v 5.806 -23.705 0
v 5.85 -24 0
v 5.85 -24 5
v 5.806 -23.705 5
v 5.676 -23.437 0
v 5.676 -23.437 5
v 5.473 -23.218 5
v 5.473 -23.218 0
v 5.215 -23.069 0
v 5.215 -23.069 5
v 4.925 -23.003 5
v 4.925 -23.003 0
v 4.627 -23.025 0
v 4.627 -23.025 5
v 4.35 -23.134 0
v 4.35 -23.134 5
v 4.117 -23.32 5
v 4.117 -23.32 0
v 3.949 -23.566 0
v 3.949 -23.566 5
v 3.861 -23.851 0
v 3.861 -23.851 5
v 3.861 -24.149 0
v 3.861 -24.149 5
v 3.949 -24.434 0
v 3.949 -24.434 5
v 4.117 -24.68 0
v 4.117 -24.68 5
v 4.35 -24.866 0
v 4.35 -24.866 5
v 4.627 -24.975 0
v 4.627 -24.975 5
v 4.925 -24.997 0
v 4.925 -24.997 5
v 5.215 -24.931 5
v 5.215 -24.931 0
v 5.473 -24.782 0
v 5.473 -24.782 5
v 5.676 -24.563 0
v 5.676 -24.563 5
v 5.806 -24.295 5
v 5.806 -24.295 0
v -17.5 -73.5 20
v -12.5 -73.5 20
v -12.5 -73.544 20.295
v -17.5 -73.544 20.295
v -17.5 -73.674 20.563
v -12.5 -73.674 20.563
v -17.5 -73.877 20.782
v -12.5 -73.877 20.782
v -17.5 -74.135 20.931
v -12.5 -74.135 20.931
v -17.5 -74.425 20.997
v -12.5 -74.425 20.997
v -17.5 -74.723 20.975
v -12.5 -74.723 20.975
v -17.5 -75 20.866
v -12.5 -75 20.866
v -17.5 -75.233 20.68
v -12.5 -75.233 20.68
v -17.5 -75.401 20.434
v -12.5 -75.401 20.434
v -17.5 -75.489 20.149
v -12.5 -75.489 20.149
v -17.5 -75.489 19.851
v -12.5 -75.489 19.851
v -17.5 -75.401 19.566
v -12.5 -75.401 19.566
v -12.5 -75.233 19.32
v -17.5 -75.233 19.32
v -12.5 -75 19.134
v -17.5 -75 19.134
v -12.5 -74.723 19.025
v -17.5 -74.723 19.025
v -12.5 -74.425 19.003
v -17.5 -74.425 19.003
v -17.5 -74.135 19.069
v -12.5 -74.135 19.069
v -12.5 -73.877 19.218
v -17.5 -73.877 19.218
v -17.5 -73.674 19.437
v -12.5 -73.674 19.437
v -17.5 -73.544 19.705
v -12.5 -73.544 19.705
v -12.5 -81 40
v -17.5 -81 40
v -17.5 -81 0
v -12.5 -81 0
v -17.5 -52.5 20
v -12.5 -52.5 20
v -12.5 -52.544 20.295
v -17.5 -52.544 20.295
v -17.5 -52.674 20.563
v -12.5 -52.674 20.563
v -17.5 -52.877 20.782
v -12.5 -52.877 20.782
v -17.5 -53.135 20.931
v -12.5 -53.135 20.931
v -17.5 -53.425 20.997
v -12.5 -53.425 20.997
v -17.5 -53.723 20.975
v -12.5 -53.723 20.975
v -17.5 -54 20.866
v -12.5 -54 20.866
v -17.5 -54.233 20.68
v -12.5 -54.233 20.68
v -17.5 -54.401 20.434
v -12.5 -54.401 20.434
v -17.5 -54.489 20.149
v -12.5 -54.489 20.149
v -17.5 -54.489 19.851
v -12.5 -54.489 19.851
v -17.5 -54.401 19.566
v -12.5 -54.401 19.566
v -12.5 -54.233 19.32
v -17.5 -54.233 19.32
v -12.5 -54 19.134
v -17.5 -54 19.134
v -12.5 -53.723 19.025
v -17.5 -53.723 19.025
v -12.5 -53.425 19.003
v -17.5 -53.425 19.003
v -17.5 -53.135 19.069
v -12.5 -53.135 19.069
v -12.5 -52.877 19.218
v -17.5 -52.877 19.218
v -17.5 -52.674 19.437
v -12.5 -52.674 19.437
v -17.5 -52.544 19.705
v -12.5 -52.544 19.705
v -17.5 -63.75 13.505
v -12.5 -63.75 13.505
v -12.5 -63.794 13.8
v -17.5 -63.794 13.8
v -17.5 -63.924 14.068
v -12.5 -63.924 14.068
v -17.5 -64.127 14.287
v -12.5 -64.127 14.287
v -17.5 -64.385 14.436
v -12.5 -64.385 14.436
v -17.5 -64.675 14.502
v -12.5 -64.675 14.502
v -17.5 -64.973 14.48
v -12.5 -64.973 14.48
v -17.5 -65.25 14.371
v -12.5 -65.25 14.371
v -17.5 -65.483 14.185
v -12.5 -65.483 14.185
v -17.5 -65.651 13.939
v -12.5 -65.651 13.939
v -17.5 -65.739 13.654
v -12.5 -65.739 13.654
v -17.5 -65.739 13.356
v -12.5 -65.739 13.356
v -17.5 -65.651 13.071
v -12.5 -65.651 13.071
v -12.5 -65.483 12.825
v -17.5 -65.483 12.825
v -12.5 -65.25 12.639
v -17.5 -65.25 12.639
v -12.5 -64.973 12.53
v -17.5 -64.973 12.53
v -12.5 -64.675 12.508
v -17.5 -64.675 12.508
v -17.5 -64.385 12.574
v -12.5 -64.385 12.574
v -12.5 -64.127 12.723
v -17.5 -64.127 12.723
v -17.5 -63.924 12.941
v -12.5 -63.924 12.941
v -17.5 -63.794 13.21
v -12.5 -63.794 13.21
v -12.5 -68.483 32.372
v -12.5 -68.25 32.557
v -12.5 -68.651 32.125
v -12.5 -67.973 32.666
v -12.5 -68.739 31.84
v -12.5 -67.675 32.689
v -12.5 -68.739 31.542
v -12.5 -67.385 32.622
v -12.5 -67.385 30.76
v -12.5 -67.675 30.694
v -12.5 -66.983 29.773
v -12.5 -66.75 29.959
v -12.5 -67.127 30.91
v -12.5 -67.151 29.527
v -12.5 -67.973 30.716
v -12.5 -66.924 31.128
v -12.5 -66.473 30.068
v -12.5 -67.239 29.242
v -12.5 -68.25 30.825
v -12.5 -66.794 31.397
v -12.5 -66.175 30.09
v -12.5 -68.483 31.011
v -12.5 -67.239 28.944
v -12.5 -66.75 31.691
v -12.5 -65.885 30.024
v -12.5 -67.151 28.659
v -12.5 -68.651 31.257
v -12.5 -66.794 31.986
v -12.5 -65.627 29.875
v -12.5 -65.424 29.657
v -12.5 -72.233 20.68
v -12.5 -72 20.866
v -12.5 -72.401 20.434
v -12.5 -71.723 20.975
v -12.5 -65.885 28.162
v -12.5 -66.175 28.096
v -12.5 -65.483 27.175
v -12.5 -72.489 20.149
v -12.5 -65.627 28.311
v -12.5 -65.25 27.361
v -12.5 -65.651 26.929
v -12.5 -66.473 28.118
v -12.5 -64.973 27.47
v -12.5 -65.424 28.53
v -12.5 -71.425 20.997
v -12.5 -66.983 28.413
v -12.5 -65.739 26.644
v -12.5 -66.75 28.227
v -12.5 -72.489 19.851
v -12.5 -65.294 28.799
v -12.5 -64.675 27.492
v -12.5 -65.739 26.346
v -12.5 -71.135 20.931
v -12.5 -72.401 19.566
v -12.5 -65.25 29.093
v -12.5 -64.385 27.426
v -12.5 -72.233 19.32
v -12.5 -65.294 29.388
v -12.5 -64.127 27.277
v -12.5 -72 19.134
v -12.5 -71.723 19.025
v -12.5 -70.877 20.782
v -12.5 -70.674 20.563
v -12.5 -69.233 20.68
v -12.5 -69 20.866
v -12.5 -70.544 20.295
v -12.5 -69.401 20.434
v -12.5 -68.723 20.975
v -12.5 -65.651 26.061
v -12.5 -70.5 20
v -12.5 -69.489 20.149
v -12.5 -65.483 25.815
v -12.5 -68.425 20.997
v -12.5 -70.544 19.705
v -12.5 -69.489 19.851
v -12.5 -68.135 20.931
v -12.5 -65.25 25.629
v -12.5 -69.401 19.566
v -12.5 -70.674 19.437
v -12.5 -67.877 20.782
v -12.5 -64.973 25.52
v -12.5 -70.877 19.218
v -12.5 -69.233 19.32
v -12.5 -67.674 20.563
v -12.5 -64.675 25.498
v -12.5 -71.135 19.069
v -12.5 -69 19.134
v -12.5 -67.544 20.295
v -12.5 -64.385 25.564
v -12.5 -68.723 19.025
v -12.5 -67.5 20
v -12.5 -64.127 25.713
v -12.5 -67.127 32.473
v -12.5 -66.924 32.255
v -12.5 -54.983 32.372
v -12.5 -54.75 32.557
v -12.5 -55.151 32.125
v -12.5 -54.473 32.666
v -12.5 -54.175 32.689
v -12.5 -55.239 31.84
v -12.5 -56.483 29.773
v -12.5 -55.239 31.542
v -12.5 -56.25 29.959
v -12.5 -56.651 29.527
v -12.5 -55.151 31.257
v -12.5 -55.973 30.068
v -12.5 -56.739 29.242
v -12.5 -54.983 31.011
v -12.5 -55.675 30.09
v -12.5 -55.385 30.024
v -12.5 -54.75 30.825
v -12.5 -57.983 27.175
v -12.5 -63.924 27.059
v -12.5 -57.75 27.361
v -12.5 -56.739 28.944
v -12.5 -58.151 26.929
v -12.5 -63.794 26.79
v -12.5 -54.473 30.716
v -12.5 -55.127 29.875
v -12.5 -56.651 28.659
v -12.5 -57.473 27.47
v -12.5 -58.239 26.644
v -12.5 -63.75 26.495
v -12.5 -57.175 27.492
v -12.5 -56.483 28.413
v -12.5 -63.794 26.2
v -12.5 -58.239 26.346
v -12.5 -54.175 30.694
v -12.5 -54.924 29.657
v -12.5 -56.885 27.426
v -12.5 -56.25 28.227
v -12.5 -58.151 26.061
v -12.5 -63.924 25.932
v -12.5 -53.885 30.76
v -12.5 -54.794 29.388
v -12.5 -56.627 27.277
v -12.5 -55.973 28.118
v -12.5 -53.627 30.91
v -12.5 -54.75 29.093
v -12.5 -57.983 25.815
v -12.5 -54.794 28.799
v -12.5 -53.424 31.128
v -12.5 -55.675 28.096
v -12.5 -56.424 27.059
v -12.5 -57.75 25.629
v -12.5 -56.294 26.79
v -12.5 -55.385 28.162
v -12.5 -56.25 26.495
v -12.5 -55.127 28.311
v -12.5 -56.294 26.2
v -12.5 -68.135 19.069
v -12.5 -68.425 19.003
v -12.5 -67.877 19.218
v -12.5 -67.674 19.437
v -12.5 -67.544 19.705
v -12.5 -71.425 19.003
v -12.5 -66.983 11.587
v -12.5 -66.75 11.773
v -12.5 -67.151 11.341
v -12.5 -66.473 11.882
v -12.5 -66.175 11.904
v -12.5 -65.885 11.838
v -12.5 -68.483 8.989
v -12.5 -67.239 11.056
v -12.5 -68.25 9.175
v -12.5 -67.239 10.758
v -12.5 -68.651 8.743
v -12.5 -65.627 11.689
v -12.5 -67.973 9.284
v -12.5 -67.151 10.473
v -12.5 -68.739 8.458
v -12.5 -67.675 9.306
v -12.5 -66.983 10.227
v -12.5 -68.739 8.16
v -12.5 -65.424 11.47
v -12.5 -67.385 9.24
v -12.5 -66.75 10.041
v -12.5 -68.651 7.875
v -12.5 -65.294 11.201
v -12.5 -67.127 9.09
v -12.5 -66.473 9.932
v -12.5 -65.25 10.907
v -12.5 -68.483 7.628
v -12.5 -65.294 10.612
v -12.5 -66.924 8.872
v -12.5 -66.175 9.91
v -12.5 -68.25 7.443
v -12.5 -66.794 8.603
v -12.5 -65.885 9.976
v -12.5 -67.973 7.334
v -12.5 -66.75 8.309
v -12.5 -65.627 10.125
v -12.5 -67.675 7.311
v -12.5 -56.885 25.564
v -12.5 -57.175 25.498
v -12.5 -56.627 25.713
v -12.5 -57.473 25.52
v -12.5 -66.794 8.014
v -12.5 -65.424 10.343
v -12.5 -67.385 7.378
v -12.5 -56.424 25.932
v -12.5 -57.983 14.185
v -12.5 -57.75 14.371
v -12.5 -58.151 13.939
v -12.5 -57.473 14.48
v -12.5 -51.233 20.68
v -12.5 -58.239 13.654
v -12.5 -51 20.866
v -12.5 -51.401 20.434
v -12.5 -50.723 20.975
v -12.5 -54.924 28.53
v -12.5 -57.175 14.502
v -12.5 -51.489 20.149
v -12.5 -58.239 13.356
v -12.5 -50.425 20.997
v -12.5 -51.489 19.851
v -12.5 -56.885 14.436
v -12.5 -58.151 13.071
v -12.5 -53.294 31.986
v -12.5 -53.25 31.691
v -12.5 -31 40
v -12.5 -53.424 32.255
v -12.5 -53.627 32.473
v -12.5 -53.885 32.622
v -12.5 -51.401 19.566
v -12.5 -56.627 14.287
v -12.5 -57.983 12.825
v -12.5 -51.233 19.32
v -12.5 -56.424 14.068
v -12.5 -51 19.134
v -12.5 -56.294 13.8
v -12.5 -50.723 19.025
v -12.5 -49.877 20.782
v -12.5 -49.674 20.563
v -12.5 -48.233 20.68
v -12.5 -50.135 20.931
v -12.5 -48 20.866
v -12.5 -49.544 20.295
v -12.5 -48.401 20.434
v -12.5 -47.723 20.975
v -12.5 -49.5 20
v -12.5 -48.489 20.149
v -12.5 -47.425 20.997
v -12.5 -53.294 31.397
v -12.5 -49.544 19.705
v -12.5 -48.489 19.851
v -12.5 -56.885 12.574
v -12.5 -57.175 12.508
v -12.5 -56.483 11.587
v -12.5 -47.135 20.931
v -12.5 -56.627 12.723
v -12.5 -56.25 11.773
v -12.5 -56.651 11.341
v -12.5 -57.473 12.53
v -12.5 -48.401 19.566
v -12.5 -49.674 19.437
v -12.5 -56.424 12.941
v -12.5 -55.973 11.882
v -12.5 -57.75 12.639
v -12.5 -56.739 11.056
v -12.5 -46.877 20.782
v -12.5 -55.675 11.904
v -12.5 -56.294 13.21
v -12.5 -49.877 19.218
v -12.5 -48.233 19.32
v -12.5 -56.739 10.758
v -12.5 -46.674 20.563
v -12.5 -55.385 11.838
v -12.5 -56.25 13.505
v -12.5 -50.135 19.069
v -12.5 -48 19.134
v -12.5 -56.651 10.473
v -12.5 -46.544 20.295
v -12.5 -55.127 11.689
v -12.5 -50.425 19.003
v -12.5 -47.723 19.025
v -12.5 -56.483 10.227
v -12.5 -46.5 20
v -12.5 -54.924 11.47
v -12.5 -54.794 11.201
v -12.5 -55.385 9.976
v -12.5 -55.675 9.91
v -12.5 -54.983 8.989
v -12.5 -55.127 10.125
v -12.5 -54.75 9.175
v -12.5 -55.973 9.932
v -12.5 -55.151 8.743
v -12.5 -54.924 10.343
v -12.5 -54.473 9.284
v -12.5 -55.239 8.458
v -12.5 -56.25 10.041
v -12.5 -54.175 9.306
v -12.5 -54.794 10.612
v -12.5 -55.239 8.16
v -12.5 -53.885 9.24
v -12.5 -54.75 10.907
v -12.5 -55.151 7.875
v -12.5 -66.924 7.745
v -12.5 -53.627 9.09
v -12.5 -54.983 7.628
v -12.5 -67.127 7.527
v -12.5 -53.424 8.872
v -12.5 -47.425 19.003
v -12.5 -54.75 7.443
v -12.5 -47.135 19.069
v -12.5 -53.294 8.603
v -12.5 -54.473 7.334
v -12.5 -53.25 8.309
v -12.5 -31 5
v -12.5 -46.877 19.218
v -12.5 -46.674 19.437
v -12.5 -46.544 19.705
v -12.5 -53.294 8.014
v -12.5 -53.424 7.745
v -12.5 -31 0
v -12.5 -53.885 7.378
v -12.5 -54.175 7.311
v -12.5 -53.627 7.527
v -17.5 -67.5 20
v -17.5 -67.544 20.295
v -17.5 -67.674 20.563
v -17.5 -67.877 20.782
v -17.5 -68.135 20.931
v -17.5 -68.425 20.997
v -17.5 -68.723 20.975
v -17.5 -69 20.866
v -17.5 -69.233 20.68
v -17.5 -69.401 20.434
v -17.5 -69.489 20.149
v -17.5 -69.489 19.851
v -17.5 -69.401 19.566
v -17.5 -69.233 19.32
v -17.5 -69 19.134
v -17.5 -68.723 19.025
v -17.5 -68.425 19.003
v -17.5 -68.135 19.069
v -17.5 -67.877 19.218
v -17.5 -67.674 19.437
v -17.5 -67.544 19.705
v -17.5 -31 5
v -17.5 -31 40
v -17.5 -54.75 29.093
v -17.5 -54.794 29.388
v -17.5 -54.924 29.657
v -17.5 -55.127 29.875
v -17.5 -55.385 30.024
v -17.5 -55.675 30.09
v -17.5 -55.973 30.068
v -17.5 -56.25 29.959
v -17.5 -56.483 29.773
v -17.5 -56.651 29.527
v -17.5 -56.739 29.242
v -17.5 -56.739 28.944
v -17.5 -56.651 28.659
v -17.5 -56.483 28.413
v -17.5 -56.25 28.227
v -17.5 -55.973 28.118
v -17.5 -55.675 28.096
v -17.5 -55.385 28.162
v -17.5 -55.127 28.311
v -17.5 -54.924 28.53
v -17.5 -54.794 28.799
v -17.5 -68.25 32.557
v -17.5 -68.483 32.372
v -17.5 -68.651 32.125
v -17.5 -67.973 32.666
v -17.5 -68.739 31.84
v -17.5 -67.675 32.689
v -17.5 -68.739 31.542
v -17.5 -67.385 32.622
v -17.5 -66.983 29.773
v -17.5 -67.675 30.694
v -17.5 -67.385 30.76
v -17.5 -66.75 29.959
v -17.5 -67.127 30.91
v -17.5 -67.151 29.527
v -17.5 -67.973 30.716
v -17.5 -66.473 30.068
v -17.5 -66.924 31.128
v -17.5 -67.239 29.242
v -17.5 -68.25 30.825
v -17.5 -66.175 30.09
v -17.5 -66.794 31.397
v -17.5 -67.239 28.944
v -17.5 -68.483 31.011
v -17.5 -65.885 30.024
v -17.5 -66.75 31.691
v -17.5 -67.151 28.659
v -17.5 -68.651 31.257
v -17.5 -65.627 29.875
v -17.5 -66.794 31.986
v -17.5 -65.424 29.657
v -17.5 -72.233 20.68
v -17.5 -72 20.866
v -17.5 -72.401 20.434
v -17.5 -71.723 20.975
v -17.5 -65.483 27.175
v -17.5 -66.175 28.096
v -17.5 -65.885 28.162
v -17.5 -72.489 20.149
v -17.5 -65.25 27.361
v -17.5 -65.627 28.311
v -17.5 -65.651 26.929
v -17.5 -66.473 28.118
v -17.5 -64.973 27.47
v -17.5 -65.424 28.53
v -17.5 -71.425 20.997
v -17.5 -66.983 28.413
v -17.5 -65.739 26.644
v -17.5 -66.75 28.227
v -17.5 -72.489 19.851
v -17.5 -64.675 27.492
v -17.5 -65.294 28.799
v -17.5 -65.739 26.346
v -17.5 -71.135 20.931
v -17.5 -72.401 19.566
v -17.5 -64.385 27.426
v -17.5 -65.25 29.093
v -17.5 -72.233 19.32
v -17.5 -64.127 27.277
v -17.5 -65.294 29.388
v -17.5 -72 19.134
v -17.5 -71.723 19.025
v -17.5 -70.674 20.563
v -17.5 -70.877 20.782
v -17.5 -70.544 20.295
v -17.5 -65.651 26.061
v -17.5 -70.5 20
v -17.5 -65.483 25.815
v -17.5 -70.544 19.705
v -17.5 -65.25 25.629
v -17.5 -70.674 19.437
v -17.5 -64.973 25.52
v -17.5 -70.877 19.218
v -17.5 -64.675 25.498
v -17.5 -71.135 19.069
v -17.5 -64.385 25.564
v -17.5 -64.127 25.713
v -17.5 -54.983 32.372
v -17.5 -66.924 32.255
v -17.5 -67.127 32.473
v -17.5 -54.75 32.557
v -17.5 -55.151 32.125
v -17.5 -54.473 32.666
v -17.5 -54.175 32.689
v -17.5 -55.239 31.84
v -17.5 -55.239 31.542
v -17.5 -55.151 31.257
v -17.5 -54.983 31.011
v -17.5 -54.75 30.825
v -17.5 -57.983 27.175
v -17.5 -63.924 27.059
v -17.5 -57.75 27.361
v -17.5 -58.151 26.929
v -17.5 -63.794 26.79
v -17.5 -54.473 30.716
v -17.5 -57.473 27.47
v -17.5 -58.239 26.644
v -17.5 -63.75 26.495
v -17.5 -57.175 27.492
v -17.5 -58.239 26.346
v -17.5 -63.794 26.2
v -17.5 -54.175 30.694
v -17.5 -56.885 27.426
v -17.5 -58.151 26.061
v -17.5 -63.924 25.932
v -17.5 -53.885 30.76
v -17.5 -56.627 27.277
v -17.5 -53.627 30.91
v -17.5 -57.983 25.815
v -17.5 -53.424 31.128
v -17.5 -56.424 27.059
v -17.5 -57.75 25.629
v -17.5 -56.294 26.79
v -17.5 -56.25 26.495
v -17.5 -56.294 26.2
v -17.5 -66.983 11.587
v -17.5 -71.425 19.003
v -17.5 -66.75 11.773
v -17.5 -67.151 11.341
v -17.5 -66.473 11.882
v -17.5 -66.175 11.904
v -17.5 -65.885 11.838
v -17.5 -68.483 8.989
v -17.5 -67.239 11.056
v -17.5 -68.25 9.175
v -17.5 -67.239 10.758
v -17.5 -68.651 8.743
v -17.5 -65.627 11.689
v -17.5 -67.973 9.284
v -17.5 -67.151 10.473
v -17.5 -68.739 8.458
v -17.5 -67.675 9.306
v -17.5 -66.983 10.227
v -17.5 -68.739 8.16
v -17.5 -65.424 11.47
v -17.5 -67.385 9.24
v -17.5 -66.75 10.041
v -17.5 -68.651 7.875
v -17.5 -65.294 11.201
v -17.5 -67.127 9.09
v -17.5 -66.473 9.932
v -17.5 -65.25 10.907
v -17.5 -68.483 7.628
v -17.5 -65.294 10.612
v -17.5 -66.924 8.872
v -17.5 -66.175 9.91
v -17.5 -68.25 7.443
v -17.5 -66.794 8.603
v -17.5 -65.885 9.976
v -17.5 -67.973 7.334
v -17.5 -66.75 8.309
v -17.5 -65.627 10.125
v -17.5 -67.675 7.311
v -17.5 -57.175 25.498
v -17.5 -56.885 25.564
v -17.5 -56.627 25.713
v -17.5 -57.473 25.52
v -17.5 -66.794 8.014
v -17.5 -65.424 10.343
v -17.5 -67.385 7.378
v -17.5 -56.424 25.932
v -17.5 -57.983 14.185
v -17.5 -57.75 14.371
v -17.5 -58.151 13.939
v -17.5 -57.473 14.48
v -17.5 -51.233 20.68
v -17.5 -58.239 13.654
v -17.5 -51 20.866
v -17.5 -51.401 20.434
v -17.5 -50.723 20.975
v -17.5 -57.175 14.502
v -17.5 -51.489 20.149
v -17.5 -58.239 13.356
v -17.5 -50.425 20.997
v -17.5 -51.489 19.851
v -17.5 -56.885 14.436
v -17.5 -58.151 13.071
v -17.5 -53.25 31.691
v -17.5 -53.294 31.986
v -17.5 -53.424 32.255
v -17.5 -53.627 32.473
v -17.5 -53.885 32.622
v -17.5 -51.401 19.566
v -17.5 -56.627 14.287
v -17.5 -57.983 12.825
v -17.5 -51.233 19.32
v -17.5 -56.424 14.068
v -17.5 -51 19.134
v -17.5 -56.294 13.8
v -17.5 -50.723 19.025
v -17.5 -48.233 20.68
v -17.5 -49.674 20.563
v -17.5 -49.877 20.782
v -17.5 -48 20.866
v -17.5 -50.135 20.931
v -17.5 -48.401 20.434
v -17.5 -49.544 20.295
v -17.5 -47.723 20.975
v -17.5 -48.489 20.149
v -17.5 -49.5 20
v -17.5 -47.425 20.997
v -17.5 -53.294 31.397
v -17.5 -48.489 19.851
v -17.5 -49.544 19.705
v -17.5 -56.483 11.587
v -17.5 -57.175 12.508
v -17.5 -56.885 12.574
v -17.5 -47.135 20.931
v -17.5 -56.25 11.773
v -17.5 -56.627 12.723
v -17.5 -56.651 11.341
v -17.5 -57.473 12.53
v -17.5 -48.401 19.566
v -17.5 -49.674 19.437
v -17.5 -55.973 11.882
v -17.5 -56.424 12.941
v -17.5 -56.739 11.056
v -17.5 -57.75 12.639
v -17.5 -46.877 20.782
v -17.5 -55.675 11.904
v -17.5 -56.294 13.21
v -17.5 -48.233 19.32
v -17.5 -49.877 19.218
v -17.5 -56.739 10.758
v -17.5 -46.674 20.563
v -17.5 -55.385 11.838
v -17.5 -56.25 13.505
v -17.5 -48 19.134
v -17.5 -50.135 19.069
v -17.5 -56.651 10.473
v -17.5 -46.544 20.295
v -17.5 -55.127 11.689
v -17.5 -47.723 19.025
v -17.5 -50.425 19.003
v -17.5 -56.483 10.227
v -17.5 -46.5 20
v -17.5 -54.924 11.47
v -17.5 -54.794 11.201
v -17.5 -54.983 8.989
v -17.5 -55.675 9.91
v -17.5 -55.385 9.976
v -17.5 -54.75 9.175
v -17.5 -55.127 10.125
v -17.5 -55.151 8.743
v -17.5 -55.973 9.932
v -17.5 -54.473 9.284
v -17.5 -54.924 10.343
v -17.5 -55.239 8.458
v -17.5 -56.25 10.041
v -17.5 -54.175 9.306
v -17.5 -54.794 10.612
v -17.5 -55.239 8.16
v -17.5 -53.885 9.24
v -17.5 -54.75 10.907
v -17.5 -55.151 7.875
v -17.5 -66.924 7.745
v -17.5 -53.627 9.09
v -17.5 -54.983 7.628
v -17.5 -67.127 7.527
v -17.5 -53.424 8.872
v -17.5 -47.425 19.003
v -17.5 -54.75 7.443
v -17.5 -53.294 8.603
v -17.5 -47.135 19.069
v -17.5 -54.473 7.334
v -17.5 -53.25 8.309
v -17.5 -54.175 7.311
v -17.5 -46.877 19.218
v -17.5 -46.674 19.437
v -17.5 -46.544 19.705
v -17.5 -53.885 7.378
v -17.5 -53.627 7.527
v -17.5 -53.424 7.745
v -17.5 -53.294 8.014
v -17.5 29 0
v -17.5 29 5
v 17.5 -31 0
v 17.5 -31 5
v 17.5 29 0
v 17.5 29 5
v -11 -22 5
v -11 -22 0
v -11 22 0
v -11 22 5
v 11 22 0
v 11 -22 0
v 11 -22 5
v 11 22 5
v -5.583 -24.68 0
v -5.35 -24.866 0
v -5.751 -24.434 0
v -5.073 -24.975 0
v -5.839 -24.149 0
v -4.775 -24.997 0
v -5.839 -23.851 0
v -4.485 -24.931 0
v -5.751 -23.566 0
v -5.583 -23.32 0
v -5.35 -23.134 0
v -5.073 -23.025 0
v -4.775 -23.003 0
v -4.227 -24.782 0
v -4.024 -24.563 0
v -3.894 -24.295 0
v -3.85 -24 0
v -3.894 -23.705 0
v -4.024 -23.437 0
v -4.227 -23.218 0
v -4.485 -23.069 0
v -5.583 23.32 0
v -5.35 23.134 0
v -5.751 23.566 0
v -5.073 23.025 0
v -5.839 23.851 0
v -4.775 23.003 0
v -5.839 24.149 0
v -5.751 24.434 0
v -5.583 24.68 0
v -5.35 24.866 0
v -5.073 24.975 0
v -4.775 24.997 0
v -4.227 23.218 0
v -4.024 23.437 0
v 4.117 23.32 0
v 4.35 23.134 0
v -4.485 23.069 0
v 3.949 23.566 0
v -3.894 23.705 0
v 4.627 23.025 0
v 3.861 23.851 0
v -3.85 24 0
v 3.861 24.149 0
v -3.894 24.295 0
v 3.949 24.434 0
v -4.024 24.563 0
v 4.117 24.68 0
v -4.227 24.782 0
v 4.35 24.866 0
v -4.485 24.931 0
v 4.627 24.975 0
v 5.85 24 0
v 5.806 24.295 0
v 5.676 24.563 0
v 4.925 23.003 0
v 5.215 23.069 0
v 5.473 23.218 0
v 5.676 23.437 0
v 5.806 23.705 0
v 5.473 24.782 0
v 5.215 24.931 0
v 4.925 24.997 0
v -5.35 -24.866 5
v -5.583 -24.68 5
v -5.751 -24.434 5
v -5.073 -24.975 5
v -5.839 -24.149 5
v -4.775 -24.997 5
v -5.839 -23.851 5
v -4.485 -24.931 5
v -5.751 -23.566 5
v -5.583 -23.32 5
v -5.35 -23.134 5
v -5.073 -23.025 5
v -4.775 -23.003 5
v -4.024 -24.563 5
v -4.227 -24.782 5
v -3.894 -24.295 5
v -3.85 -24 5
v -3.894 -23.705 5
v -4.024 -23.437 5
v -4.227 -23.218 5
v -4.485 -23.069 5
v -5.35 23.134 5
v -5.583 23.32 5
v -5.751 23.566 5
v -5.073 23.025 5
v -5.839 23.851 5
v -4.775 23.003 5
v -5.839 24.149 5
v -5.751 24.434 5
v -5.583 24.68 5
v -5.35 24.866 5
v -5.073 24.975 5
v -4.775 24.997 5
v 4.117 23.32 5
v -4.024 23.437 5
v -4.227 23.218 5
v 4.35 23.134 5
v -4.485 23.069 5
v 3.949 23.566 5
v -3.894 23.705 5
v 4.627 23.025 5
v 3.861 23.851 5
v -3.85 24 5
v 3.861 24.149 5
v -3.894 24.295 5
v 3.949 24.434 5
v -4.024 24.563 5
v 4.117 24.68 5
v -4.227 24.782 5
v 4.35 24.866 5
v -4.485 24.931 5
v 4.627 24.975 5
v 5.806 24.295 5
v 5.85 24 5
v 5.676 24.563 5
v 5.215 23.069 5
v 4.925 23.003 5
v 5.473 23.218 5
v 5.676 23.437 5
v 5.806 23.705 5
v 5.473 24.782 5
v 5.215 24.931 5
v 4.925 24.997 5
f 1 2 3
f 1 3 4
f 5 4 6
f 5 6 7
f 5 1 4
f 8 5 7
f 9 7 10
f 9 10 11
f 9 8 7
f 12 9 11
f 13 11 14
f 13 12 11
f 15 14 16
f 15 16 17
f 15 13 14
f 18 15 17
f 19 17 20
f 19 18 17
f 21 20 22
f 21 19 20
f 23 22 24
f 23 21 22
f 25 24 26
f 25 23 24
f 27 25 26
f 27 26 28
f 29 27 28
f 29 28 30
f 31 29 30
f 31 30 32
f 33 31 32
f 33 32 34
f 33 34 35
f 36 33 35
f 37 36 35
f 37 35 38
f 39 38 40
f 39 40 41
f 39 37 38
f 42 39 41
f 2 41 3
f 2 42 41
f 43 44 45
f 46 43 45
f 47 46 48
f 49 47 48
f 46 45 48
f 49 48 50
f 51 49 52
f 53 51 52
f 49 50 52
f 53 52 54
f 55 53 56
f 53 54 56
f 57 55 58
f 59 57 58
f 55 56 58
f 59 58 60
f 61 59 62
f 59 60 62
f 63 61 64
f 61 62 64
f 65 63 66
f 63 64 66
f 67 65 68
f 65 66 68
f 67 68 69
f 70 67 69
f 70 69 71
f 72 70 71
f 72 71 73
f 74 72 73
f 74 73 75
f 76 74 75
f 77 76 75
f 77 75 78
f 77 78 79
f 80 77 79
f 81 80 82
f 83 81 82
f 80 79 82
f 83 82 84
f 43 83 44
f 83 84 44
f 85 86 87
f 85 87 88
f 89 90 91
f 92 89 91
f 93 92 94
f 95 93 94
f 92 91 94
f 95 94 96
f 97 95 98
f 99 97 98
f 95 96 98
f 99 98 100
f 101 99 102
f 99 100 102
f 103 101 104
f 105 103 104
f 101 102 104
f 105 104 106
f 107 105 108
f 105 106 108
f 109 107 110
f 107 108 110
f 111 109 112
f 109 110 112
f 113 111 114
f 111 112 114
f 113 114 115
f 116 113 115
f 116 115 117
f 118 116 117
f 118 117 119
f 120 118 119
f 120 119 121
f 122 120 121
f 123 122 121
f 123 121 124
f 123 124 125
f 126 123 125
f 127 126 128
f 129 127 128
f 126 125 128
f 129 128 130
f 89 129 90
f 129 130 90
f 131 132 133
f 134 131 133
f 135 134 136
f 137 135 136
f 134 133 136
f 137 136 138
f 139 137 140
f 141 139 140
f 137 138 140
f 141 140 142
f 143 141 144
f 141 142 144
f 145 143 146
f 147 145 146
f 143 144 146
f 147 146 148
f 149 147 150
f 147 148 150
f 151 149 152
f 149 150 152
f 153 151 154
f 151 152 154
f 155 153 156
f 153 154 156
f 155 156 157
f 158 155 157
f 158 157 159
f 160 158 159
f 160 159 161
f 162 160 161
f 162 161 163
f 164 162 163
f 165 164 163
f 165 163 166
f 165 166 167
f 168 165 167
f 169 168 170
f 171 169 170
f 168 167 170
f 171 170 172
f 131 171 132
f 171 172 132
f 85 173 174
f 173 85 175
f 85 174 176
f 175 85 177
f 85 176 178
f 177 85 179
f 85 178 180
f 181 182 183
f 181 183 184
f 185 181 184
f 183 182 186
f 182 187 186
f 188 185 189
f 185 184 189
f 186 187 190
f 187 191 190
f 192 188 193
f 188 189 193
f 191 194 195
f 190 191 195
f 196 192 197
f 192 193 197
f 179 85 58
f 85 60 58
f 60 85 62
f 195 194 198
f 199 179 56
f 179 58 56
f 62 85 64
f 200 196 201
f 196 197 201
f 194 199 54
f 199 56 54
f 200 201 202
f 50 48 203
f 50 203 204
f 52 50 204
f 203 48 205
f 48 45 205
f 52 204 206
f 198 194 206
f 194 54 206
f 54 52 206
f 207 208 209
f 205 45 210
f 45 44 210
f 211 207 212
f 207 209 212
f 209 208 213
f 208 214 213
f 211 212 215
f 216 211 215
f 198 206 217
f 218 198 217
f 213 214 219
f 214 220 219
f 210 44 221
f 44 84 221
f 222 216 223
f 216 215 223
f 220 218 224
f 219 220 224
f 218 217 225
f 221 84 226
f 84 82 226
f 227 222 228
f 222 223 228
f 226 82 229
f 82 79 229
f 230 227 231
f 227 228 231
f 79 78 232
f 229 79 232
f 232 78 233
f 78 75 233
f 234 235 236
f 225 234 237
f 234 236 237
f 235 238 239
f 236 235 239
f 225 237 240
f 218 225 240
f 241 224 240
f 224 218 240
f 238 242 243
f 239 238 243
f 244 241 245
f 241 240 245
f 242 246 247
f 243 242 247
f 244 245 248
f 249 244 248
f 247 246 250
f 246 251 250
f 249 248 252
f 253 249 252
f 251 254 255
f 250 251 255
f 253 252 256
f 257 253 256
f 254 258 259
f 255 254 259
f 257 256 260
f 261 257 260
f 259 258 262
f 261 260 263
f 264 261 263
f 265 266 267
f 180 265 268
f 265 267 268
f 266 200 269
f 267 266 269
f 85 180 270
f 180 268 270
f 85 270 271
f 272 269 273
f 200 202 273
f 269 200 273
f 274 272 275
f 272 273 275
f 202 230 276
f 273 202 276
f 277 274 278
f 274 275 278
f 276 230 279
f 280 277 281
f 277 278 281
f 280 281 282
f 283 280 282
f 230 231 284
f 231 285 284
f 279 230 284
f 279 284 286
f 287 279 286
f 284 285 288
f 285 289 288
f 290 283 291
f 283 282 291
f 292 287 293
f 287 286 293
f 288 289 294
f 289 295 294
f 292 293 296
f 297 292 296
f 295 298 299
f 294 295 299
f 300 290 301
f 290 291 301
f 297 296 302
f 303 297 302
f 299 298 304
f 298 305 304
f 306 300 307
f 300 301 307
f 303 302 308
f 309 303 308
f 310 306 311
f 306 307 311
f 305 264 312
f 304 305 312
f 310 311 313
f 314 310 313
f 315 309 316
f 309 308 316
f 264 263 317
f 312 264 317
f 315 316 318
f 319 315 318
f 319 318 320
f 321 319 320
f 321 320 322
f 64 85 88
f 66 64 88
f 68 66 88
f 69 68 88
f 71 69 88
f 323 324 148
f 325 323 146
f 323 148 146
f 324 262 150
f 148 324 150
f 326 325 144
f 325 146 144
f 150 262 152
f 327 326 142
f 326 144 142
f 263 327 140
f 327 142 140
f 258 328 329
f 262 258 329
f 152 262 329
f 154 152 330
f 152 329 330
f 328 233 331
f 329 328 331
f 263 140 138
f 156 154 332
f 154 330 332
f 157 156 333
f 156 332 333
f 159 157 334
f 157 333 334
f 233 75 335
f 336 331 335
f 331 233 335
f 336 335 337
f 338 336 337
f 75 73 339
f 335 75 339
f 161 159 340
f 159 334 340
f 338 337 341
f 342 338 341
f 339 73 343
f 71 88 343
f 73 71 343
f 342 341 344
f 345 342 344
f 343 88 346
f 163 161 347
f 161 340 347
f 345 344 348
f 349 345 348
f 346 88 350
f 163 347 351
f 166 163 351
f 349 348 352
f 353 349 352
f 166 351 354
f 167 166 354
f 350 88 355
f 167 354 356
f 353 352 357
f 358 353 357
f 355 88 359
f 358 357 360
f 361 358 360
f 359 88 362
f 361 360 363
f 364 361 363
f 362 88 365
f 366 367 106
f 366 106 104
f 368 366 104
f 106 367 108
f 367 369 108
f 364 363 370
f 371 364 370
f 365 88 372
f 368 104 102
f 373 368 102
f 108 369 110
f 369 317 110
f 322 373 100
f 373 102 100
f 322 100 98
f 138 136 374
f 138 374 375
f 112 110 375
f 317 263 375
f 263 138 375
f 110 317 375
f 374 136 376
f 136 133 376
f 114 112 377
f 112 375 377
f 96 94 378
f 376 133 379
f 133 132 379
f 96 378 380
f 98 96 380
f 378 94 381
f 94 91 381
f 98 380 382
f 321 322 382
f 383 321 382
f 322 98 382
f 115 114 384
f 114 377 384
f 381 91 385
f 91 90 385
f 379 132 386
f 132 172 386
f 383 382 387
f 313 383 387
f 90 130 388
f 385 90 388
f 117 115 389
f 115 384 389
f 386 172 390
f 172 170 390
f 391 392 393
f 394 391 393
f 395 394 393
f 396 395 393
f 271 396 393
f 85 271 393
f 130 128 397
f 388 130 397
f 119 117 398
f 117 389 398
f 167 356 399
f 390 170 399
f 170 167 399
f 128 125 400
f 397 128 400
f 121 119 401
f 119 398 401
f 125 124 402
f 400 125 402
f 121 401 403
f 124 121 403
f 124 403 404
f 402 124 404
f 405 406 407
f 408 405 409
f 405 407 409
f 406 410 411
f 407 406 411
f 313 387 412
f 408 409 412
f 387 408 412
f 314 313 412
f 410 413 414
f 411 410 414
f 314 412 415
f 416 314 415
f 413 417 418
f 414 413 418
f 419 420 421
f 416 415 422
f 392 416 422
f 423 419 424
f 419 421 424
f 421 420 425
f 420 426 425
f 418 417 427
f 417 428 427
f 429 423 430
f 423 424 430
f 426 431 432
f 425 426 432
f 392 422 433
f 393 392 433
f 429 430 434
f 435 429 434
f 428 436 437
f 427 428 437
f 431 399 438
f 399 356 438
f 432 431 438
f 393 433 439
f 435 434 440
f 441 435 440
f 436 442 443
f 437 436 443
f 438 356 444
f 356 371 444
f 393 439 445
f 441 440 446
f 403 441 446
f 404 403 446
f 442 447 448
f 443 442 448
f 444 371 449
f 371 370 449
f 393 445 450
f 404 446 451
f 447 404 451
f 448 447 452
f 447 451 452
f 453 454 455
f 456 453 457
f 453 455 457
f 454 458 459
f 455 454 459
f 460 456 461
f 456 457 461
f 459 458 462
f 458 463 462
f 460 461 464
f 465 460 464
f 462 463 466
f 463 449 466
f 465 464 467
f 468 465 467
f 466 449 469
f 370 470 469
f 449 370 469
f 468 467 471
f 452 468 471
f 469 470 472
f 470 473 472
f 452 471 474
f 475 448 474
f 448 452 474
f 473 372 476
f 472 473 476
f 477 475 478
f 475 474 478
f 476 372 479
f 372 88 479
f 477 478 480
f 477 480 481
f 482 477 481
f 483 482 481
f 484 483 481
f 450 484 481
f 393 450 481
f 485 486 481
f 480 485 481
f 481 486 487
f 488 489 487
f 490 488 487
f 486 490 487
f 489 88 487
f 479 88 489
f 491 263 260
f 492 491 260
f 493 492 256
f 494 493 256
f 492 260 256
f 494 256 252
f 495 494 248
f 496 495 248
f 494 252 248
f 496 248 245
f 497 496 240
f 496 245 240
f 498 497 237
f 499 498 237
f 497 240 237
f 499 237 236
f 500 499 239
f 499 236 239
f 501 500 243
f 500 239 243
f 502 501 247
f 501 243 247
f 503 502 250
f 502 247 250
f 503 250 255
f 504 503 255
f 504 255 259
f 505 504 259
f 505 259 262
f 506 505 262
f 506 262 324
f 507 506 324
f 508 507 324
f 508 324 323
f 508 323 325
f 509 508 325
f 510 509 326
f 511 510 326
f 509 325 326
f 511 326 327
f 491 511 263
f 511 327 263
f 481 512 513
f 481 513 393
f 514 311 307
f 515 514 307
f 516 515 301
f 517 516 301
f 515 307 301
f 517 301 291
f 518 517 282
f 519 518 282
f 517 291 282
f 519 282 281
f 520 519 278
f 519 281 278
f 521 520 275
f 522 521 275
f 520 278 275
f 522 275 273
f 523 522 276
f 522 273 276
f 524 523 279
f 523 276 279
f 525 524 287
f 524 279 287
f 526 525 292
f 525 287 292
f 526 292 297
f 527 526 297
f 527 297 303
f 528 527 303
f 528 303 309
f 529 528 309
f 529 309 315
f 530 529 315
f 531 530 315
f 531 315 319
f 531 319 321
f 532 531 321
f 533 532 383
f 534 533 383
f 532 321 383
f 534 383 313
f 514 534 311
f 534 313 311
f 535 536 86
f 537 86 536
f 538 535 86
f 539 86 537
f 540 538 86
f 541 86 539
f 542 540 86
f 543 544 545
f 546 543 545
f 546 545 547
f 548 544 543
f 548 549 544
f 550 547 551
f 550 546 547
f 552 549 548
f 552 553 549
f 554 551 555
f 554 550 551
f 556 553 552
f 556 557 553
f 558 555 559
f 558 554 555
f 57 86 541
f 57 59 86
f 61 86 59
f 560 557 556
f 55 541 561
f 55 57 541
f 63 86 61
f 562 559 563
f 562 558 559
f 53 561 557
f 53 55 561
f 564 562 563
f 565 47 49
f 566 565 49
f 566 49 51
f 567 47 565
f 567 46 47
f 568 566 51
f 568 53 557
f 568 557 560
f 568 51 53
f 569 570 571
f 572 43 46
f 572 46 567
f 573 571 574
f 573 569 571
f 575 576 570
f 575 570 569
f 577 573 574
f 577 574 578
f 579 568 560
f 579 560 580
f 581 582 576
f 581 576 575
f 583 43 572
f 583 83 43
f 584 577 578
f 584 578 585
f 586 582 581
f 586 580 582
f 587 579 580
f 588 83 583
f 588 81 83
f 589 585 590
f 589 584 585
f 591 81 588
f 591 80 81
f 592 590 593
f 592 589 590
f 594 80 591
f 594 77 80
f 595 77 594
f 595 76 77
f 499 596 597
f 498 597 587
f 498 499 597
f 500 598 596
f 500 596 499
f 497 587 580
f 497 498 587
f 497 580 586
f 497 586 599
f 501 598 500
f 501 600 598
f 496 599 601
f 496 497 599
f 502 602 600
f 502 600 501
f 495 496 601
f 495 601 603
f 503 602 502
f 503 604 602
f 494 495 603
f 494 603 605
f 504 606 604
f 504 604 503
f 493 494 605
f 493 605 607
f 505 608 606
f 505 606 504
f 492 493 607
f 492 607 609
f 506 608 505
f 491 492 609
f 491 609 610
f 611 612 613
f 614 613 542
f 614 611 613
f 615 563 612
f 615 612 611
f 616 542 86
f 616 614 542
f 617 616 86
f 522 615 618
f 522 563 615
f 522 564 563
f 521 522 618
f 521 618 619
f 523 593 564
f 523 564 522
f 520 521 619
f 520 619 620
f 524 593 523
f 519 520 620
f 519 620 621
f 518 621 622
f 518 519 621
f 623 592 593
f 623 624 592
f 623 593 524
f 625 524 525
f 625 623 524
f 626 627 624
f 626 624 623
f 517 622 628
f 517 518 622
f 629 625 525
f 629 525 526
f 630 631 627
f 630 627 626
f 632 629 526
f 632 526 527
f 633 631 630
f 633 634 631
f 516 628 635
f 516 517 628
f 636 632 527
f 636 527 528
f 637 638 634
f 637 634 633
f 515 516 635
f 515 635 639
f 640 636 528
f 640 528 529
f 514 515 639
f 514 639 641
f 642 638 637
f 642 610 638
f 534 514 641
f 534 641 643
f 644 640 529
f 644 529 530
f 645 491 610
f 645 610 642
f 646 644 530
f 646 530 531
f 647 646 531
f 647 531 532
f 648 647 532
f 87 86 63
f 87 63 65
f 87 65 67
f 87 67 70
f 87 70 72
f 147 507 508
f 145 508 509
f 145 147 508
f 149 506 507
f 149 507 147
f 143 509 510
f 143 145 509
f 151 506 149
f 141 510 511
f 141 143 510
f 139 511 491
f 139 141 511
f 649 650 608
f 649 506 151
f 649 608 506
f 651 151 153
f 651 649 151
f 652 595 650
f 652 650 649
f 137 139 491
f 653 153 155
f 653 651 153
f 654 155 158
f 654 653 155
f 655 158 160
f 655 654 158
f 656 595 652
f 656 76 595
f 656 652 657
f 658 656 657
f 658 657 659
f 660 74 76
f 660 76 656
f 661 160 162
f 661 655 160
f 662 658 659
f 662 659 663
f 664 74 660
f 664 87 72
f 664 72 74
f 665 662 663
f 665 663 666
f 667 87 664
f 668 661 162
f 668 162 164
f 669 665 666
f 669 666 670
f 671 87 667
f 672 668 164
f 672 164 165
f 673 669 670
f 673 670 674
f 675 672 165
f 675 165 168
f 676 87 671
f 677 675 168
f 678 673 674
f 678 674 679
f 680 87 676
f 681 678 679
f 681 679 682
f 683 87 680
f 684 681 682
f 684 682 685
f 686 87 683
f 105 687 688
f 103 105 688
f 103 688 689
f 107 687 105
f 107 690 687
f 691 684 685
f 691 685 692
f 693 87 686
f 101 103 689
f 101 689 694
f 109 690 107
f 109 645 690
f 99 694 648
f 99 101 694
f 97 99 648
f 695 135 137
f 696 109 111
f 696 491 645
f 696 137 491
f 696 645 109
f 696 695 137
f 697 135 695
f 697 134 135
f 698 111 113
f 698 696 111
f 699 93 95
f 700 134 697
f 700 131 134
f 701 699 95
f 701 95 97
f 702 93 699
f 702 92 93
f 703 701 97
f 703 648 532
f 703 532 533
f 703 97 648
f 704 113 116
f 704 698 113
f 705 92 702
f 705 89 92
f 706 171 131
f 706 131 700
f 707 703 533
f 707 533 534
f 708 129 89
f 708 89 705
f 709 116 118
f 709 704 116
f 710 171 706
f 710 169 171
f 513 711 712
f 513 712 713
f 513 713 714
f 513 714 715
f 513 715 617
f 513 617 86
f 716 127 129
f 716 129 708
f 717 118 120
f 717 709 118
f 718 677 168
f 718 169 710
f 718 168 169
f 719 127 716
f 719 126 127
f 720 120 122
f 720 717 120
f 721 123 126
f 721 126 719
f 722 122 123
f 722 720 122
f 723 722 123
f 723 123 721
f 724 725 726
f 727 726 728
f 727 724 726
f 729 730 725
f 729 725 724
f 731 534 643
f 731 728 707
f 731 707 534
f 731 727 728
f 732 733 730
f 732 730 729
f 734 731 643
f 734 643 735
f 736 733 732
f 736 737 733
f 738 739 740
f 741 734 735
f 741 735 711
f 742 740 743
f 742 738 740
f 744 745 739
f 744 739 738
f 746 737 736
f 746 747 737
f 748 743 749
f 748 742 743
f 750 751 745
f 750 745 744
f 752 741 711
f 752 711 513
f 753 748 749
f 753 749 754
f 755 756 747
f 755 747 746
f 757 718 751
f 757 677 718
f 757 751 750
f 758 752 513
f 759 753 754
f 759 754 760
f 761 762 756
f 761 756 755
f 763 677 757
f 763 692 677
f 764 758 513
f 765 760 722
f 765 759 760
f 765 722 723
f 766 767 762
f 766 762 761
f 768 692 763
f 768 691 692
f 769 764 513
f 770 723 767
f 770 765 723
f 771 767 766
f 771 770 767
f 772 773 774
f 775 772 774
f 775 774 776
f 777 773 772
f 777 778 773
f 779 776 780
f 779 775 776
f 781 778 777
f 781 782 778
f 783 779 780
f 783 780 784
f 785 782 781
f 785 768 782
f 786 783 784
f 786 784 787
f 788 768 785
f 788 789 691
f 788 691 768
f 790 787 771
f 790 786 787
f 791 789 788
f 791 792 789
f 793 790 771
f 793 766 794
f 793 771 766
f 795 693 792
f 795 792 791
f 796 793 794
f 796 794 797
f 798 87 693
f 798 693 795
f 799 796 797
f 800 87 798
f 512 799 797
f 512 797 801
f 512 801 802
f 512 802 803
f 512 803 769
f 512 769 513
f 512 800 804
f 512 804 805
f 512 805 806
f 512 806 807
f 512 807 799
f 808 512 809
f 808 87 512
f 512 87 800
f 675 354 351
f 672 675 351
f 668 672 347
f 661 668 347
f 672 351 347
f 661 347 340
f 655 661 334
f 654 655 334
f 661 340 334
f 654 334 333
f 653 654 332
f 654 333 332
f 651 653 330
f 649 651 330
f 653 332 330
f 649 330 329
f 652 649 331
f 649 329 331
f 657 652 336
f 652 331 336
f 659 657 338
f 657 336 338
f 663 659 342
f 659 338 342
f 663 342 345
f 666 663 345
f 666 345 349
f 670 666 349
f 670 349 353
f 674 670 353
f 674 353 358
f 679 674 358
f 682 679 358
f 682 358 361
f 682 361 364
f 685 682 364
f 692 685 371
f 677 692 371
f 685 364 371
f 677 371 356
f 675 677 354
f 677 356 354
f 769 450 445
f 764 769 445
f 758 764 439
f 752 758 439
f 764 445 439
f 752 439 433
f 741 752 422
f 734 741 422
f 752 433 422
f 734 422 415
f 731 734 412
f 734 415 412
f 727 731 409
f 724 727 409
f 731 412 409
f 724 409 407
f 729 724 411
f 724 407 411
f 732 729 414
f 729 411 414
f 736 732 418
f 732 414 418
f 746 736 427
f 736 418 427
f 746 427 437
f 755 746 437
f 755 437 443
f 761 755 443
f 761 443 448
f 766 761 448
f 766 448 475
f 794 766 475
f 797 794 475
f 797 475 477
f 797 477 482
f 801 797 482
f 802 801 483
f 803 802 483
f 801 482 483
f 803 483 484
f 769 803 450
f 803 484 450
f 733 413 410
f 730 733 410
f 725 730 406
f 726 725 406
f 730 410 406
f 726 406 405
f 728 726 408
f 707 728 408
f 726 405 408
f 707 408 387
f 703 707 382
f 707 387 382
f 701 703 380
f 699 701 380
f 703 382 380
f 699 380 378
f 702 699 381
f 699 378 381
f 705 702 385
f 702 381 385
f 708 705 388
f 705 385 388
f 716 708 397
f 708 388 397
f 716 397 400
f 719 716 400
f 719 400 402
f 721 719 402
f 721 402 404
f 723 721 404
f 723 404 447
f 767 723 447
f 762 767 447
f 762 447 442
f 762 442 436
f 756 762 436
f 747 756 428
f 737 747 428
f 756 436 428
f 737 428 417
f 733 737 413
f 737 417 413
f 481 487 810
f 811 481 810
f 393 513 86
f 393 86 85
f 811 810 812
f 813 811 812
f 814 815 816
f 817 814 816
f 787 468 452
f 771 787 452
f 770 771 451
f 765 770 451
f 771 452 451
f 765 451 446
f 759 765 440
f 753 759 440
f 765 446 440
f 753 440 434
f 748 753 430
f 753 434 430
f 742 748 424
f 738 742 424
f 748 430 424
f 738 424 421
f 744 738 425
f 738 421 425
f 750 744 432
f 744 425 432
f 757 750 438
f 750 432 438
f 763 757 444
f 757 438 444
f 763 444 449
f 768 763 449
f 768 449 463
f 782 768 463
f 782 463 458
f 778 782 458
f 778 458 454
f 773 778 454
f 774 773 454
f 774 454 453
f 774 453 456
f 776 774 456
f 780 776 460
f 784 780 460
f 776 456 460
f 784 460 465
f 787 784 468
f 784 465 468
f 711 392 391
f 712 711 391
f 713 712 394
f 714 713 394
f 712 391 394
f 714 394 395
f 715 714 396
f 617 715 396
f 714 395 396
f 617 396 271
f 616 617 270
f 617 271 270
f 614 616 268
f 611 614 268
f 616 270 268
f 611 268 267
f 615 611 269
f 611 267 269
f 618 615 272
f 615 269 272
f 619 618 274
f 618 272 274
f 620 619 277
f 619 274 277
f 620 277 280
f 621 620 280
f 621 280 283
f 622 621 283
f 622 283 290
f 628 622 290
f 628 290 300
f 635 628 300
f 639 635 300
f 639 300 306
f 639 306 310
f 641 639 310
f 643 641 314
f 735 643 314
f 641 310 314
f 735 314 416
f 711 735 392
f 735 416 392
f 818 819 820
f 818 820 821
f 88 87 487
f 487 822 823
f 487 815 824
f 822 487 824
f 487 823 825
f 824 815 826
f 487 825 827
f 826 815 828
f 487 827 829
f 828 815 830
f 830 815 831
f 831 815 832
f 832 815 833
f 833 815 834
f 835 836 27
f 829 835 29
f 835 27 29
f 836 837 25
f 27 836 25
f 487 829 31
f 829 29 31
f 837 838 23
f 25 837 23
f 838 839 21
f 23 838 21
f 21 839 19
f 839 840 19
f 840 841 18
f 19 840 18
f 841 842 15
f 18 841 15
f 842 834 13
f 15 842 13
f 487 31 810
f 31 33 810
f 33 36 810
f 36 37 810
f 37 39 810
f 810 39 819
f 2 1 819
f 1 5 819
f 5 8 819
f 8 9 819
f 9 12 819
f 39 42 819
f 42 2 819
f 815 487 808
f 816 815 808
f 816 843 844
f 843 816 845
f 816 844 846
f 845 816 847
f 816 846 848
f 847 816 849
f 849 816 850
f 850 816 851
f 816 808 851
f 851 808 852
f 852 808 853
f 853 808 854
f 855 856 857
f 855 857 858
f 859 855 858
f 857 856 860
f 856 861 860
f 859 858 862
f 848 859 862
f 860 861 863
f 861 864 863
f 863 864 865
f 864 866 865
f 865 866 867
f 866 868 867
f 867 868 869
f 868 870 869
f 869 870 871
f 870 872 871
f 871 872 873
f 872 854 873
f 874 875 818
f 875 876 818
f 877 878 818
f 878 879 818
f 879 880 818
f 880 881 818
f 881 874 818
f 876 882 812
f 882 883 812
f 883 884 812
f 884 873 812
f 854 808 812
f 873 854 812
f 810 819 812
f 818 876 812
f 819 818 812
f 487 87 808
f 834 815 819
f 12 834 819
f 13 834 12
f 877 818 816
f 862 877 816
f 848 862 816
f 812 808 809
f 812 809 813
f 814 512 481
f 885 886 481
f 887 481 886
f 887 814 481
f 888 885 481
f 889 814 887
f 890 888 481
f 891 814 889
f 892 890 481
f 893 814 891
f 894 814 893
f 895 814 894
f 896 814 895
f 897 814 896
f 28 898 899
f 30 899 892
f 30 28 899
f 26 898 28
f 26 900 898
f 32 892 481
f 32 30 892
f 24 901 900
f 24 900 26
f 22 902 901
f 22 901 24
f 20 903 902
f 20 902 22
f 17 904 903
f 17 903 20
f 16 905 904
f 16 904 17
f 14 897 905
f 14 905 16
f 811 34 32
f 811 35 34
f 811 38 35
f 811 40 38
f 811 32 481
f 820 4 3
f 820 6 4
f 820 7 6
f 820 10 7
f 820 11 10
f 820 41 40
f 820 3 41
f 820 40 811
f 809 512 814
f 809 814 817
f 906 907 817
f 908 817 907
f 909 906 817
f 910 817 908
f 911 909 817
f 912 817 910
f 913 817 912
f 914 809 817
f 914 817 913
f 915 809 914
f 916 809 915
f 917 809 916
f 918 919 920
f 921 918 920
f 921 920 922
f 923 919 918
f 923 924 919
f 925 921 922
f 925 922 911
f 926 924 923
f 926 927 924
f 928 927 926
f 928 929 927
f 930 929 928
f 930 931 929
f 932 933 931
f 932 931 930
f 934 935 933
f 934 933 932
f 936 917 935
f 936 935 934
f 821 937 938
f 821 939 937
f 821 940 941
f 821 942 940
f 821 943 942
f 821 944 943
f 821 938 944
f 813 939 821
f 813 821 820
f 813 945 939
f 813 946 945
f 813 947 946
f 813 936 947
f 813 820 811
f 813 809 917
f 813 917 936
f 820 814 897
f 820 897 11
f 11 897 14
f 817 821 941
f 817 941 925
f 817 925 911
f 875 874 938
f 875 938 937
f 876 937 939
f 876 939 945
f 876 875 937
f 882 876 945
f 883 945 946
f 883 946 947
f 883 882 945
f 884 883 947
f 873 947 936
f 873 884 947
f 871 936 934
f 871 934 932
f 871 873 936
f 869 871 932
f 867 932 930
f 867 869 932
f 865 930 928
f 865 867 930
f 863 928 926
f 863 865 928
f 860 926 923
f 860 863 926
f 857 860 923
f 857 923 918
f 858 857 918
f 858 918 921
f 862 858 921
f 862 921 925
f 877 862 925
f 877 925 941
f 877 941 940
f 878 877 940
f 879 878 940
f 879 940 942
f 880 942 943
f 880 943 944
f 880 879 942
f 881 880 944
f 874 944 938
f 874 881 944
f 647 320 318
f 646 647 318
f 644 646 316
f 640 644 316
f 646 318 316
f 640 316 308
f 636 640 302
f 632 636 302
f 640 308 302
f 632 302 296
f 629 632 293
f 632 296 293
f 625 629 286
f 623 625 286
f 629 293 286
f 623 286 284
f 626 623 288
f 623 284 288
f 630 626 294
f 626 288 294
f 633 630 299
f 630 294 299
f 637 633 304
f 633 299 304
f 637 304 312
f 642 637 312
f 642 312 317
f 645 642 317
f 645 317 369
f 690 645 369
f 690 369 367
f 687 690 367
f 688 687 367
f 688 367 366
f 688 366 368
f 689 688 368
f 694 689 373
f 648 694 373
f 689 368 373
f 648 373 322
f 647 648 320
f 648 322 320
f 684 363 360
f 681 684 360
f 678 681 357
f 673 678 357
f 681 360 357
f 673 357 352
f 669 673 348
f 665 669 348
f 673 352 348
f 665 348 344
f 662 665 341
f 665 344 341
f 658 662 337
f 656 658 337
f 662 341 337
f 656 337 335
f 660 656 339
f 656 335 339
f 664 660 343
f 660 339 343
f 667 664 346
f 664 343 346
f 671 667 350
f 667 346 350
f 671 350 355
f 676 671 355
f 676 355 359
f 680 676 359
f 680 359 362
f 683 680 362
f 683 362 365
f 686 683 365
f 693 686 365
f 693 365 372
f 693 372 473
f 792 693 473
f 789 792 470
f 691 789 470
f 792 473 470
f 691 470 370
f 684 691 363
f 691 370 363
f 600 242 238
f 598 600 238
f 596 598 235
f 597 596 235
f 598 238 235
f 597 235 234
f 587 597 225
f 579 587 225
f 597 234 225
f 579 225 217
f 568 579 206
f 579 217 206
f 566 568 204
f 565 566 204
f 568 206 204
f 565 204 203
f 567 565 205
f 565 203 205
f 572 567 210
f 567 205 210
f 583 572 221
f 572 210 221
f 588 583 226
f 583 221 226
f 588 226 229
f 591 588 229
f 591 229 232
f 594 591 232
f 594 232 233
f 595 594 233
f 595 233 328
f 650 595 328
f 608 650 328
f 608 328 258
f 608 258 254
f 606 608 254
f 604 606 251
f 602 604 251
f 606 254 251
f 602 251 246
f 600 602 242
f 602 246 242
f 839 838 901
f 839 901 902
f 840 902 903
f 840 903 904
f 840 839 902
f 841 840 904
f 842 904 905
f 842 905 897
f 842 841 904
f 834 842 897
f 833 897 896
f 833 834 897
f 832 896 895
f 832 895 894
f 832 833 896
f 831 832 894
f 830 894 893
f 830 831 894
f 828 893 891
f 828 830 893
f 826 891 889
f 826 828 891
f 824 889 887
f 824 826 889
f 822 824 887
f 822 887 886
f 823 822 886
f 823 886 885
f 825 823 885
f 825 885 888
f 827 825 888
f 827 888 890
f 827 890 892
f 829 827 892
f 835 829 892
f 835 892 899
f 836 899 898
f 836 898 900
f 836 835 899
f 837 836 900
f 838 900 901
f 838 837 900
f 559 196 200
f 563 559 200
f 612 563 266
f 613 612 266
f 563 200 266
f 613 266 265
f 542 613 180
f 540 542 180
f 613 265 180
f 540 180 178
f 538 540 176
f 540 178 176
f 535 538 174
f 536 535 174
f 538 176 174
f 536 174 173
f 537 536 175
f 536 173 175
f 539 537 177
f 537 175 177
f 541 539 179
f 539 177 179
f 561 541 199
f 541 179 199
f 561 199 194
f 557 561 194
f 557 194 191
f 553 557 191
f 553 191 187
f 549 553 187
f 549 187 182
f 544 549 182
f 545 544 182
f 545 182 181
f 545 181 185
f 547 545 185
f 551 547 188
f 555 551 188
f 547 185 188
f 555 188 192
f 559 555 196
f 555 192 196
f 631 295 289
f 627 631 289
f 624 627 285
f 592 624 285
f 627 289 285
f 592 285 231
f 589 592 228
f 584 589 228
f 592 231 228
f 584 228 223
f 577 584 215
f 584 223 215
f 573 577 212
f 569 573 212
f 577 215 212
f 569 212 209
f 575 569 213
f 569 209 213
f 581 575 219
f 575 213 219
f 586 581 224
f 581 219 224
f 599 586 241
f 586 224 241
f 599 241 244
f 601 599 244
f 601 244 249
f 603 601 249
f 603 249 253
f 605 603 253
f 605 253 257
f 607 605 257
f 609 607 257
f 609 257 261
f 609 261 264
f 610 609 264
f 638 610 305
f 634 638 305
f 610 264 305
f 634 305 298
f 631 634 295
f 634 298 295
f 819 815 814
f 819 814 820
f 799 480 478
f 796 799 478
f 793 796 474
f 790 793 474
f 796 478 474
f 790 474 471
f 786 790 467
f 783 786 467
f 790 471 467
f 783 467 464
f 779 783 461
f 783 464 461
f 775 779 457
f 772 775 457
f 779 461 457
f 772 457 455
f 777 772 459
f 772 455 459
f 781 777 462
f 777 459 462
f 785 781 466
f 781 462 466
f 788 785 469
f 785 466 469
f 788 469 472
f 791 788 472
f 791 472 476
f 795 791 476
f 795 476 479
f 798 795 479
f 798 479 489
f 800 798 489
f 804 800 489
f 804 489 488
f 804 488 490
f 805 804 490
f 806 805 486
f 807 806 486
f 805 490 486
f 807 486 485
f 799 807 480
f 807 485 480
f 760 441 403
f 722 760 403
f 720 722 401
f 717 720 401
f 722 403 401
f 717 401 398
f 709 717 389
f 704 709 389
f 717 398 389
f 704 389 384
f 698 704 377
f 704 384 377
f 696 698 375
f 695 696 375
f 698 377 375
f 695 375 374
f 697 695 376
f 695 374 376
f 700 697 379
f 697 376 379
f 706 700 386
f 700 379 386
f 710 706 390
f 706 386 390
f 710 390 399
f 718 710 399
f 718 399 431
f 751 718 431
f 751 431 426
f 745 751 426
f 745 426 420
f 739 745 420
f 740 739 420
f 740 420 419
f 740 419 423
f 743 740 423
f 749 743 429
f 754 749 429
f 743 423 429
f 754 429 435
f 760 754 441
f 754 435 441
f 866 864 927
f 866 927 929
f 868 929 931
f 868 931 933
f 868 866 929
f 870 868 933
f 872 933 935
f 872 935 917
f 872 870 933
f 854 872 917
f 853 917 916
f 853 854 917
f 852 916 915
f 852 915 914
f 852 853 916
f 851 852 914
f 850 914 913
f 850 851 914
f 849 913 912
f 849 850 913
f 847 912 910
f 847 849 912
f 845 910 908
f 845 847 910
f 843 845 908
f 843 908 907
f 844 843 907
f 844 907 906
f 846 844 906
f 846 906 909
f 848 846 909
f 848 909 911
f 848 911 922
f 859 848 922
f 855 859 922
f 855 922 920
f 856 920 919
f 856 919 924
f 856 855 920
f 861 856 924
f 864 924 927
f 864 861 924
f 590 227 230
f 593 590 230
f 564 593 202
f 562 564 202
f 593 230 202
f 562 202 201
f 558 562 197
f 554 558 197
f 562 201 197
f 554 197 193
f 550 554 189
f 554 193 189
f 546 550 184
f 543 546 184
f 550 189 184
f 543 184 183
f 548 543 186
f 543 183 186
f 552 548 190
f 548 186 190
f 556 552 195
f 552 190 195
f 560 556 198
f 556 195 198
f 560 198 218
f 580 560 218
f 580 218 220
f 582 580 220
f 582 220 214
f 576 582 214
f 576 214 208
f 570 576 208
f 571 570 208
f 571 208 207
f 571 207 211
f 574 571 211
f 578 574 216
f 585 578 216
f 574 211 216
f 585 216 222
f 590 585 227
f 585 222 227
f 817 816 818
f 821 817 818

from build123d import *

# Parameters (mm, degrees)
SKETCH1_W           = 35
SKETCH1_H           = 60
SKETCH1_R           = 1
SKETCH1_W_2         = 22
SKETCH1_H_2         = 44
BOSS_EXTRUDE1_DEPTH = 5
SKETCH2_W           = 5
SKETCH2_H           = 50
BOSS_EXTRUDE2_DEPTH = 40
SKETCH3_R           = 1
CUT_EXTRUDE1_DEPTH  = 5


with BuildPart() as part:
    # Sketch1 → Boss-Extrude1 (new body)
    with BuildSketch(Plane.XY):
        with Locations((0, -1)):
            Rectangle(SKETCH1_W, SKETCH1_H)
        with Locations((-4.85, -24)):
            Circle(SKETCH1_R, mode=Mode.SUBTRACT)
        with Locations((4.85, -24)):
            Circle(SKETCH1_R, mode=Mode.SUBTRACT)
        with Locations((4.85, 24)):
            Circle(SKETCH1_R, mode=Mode.SUBTRACT)
        with Locations((-4.85, 24)):
            Circle(SKETCH1_R, mode=Mode.SUBTRACT)
        Rectangle(SKETCH1_W_2, SKETCH1_H_2, mode=Mode.SUBTRACT)
    extrude(amount=BOSS_EXTRUDE1_DEPTH)

    # Sketch2 → Boss-Extrude2 (add)
    with BuildSketch(Plane.XY):
        with Locations((-15, -56)):
            Rectangle(SKETCH2_W, SKETCH2_H)
    extrude(amount=BOSS_EXTRUDE2_DEPTH)

    # Sketch3 → Cut-Extrude1 (cut)
    with BuildSketch(Plane(origin=(-12.5, 0, 0), x_dir=(0, 0, -1), z_dir=(1, 0, 0))):
        with Locations(Location((-20, -74.5, 0), (0, 0, 90))):
            Circle(SKETCH3_R)
        with Locations(Location((-20, -71.5, 0), (0, 0, 90))):
            Circle(SKETCH3_R)
        with Locations(Location((-20, -68.5, 0), (0, 0, 90))):
            Circle(SKETCH3_R)
        with Locations(Location((-26.495190528, -64.75, 0), (0, 0, 90))):
            Circle(SKETCH3_R)
        with Locations(Location((-29.09326674, -66.25, 0), (0, 0, 90))):
            Circle(SKETCH3_R)
        with Locations(Location((-31.691342951, -67.75, 0), (0, 0, 90))):
            Circle(SKETCH3_R)
        with Locations(Location((-26.495190528, -57.25, 0), (0, 0, 90))):
            Circle(SKETCH3_R)
        with Locations(Location((-29.09326674, -55.75, 0), (0, 0, 90))):
            Circle(SKETCH3_R)
        with Locations(Location((-31.691342951, -54.25, 0), (0, 0, 90))):
            Circle(SKETCH3_R)
        with Locations(Location((-20, -53.5, 0), (0, 0, 90))):
            Circle(SKETCH3_R)
        with Locations(Location((-20, -50.5, 0), (0, 0, 90))):
            Circle(SKETCH3_R)
        with Locations(Location((-20, -47.5, 0), (0, 0, 90))):
            Circle(SKETCH3_R)
        with Locations(Location((-13.504809472, -57.25, 0), (0, 0, 90))):
            Circle(SKETCH3_R)
        with Locations(Location((-10.90673326, -55.75, 0), (0, 0, 90))):
            Circle(SKETCH3_R)
        with Locations(Location((-8.308657049, -54.25, 0), (0, 0, 90))):
            Circle(SKETCH3_R)
        with Locations(Location((-13.504809472, -64.75, 0), (0, 0, 90))):
            Circle(SKETCH3_R)
        with Locations(Location((-10.90673326, -66.25, 0), (0, 0, 90))):
            Circle(SKETCH3_R)
        with Locations(Location((-8.308657049, -67.75, 0), (0, 0, 90))):
            Circle(SKETCH3_R)
    extrude(amount=-CUT_EXTRUDE1_DEPTH, mode=Mode.SUBTRACT)


solid = part.part
